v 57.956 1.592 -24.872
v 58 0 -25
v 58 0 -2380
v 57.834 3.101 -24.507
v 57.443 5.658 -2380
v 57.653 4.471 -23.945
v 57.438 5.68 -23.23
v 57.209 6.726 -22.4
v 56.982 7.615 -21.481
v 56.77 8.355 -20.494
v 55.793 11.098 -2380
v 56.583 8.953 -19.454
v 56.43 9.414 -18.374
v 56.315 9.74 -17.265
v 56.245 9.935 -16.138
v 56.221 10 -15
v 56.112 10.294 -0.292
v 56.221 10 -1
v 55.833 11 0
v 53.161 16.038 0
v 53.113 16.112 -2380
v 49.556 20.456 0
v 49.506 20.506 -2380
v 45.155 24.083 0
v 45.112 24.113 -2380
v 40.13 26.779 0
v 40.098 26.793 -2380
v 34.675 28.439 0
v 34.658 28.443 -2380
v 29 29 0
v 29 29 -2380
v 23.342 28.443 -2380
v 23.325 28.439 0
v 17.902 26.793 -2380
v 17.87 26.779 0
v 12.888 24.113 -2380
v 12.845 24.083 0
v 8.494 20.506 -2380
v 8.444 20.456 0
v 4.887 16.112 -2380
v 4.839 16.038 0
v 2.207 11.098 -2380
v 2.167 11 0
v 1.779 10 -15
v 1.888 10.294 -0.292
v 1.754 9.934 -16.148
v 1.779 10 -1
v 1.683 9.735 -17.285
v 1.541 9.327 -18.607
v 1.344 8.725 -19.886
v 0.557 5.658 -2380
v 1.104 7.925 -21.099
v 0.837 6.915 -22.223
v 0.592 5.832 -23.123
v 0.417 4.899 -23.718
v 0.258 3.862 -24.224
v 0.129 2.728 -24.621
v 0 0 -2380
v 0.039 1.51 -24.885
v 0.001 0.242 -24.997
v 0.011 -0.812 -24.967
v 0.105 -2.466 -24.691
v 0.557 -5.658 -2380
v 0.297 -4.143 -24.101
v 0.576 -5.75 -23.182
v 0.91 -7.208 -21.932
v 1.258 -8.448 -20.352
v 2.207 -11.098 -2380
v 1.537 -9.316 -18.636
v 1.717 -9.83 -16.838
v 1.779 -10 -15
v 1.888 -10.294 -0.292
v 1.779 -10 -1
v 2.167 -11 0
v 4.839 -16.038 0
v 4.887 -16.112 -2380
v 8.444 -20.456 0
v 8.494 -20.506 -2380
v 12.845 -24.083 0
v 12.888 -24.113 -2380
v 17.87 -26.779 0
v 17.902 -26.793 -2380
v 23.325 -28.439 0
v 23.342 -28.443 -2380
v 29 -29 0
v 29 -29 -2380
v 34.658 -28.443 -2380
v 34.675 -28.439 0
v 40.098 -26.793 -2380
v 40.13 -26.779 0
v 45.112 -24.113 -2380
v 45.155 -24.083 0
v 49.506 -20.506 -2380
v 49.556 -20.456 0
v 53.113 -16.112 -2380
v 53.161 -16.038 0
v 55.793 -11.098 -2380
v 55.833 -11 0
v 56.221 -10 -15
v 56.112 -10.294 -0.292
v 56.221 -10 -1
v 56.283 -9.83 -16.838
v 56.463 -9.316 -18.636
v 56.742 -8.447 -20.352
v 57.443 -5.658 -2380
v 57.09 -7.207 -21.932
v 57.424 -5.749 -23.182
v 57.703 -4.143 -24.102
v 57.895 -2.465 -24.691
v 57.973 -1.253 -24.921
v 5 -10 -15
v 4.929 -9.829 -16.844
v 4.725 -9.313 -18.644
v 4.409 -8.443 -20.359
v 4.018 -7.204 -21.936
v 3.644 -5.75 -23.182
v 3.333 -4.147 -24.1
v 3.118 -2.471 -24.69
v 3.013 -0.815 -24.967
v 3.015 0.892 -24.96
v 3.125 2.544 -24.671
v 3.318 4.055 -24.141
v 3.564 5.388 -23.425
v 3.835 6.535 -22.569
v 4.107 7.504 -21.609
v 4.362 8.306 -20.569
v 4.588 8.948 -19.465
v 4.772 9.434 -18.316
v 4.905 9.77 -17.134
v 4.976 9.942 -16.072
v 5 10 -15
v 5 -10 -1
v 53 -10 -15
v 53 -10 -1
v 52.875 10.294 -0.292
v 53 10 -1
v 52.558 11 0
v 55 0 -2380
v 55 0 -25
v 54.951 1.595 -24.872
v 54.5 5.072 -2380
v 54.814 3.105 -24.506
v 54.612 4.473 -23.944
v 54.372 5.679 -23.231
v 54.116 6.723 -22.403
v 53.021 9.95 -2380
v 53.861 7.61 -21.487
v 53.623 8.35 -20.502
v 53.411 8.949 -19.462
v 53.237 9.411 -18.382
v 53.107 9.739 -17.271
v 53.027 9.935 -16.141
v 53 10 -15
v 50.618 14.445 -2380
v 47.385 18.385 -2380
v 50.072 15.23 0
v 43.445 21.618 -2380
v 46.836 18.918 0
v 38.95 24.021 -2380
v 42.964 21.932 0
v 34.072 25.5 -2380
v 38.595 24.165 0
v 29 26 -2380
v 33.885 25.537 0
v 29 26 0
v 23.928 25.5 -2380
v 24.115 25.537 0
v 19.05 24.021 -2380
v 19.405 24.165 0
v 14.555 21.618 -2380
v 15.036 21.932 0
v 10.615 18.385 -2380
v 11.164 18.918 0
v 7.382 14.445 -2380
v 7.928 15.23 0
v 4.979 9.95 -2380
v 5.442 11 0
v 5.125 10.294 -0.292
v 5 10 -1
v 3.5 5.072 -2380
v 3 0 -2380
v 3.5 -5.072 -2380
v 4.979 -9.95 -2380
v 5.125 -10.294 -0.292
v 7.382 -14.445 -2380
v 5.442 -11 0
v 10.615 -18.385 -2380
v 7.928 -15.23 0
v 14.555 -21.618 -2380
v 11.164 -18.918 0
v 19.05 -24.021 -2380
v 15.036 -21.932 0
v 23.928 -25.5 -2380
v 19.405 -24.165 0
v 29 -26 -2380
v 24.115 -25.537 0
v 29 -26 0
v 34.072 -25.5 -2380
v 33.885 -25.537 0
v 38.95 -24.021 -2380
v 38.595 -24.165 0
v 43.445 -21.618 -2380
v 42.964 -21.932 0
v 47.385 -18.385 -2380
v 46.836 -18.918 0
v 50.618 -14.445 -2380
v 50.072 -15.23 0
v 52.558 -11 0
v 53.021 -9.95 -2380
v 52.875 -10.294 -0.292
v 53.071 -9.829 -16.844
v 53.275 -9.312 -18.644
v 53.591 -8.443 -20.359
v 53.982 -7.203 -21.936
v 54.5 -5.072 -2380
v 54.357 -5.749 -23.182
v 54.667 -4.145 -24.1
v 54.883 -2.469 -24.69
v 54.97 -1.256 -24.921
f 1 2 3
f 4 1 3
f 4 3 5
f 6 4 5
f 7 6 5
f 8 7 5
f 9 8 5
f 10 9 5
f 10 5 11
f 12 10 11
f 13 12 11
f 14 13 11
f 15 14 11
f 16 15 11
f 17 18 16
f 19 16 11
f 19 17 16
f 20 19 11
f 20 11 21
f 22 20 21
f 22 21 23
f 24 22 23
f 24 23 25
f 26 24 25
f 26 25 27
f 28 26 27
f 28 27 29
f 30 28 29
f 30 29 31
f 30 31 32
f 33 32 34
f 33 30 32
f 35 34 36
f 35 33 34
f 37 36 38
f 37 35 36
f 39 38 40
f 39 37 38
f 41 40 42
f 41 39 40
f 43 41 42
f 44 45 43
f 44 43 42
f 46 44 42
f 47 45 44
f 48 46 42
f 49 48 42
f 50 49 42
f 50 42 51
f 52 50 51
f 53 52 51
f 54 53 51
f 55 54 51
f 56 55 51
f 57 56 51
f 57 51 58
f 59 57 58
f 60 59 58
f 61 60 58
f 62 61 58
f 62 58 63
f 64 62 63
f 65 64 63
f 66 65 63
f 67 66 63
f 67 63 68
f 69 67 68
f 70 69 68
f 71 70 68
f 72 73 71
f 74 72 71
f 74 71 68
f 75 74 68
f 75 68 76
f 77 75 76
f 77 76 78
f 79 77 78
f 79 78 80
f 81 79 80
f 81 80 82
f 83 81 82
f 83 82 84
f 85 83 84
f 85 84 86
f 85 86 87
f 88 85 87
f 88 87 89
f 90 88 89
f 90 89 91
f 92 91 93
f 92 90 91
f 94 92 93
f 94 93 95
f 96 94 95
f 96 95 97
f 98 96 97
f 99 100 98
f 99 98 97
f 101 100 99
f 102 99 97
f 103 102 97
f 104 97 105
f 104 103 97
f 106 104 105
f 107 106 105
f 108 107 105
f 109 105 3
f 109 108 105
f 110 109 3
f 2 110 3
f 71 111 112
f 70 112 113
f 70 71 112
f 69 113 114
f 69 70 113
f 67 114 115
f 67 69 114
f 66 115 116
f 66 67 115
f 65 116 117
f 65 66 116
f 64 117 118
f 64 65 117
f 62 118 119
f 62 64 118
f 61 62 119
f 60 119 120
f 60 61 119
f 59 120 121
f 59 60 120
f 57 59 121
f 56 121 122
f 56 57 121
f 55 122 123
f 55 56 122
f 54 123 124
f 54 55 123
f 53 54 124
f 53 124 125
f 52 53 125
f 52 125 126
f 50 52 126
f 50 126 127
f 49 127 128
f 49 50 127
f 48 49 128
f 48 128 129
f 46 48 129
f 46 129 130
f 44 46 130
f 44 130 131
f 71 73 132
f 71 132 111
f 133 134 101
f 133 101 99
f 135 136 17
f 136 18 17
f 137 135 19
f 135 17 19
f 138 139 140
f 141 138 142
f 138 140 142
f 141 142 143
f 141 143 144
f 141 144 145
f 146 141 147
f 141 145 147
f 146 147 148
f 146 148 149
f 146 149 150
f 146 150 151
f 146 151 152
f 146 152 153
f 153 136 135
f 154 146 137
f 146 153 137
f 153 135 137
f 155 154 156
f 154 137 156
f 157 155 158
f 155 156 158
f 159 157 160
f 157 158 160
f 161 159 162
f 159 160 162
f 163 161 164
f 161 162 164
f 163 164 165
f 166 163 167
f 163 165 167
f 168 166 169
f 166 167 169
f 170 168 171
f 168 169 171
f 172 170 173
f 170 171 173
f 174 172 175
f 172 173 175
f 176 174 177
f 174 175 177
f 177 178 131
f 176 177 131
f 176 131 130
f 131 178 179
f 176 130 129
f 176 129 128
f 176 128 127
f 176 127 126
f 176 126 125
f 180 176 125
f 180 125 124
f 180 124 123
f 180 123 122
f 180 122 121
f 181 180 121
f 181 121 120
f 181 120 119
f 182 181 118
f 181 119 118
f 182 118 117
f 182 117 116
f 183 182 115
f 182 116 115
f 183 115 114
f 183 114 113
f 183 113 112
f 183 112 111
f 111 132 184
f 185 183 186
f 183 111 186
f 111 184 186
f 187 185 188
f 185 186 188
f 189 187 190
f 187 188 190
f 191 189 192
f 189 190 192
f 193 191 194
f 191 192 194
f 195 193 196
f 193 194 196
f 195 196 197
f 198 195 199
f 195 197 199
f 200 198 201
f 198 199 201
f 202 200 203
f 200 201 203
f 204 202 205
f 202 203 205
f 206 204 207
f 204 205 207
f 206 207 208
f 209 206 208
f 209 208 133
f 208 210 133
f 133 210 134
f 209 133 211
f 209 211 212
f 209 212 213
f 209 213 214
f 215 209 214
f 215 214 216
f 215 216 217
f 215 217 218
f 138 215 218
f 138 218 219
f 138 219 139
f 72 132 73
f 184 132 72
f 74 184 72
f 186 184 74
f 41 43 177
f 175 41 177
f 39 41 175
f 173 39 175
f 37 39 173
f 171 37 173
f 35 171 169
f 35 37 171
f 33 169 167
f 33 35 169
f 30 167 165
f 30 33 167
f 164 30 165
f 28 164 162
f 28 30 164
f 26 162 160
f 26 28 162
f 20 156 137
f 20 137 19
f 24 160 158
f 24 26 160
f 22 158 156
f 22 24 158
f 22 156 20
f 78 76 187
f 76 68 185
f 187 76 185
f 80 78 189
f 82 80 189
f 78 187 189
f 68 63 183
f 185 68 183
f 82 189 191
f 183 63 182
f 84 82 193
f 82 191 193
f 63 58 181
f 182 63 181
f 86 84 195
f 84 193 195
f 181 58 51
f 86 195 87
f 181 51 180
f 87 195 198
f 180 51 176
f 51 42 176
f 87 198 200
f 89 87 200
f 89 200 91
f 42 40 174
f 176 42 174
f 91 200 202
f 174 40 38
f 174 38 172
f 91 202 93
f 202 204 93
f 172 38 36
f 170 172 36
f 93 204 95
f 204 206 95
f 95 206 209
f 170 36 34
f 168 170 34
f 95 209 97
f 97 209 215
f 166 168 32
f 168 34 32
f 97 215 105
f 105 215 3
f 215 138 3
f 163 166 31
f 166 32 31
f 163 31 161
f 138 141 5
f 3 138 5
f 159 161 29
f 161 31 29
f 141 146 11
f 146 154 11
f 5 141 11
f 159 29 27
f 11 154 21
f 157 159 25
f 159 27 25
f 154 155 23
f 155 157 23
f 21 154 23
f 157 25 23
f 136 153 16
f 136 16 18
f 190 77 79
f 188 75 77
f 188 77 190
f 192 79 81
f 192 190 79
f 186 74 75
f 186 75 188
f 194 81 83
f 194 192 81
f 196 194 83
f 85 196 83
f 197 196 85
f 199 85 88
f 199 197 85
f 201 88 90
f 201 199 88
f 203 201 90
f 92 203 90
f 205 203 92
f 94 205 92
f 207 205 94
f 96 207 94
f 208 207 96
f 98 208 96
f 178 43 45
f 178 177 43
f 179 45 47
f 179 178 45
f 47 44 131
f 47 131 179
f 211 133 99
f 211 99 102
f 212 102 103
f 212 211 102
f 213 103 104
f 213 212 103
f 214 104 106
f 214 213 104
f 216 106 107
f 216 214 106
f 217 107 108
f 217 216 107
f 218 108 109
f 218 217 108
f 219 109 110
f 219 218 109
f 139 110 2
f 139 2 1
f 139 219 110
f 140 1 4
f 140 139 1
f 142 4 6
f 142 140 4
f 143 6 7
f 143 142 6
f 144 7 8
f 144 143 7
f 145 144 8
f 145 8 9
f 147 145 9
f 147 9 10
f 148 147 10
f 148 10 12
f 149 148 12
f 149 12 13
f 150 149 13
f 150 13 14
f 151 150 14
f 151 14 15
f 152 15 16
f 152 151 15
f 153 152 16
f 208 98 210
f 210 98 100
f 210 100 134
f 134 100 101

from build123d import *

# Parameters (mm, degrees)
SKETCH4_R           = 29
SKETCH4_R_2         = 26
BOSS_EXTRUDE1_DEPTH = 2380
CUT_EXTRUDE1_DEPTH  = 2381.883239472
FILLET1_R           = 1


with BuildPart() as part:
    # Sketch4 → Boss-Extrude1 (new body)
    with BuildSketch(Plane.XY):
        with Locations((29, 0)):
            Circle(SKETCH4_R)
        with Locations((29, 0)):
            Circle(SKETCH4_R_2, mode=Mode.SUBTRACT)
    extrude(amount=-BOSS_EXTRUDE1_DEPTH)

    # Sketch6 → Cut-Extrude1 (cut, through all)
    with BuildSketch(Plane(origin=(0, 0, 0), x_dir=(0, 0, -1), z_dir=(1, 0, 0))):
        with BuildLine():
            Line((0, 10), (0, -10))
            Line((0, -10), (15, -10))
            ThreePointArc((15, -10), (25, 0), (15, 10))
            Line((15, 10), (0, 10))
        make_face()
    extrude(amount=CUT_EXTRUDE1_DEPTH, mode=Mode.SUBTRACT)

    # Fillet1
    fillet1_edges = [part.edges().sort_by_distance(p)[0] for p in [
        (3.389342411, 10, 0),
        (54.610657589, 10, 0),
        (3.389342411, -10, 0),
        (54.610657589, -10, 0),
    ]]
    fillet(fillet1_edges, radius=FILLET1_R)


solid = part.part
